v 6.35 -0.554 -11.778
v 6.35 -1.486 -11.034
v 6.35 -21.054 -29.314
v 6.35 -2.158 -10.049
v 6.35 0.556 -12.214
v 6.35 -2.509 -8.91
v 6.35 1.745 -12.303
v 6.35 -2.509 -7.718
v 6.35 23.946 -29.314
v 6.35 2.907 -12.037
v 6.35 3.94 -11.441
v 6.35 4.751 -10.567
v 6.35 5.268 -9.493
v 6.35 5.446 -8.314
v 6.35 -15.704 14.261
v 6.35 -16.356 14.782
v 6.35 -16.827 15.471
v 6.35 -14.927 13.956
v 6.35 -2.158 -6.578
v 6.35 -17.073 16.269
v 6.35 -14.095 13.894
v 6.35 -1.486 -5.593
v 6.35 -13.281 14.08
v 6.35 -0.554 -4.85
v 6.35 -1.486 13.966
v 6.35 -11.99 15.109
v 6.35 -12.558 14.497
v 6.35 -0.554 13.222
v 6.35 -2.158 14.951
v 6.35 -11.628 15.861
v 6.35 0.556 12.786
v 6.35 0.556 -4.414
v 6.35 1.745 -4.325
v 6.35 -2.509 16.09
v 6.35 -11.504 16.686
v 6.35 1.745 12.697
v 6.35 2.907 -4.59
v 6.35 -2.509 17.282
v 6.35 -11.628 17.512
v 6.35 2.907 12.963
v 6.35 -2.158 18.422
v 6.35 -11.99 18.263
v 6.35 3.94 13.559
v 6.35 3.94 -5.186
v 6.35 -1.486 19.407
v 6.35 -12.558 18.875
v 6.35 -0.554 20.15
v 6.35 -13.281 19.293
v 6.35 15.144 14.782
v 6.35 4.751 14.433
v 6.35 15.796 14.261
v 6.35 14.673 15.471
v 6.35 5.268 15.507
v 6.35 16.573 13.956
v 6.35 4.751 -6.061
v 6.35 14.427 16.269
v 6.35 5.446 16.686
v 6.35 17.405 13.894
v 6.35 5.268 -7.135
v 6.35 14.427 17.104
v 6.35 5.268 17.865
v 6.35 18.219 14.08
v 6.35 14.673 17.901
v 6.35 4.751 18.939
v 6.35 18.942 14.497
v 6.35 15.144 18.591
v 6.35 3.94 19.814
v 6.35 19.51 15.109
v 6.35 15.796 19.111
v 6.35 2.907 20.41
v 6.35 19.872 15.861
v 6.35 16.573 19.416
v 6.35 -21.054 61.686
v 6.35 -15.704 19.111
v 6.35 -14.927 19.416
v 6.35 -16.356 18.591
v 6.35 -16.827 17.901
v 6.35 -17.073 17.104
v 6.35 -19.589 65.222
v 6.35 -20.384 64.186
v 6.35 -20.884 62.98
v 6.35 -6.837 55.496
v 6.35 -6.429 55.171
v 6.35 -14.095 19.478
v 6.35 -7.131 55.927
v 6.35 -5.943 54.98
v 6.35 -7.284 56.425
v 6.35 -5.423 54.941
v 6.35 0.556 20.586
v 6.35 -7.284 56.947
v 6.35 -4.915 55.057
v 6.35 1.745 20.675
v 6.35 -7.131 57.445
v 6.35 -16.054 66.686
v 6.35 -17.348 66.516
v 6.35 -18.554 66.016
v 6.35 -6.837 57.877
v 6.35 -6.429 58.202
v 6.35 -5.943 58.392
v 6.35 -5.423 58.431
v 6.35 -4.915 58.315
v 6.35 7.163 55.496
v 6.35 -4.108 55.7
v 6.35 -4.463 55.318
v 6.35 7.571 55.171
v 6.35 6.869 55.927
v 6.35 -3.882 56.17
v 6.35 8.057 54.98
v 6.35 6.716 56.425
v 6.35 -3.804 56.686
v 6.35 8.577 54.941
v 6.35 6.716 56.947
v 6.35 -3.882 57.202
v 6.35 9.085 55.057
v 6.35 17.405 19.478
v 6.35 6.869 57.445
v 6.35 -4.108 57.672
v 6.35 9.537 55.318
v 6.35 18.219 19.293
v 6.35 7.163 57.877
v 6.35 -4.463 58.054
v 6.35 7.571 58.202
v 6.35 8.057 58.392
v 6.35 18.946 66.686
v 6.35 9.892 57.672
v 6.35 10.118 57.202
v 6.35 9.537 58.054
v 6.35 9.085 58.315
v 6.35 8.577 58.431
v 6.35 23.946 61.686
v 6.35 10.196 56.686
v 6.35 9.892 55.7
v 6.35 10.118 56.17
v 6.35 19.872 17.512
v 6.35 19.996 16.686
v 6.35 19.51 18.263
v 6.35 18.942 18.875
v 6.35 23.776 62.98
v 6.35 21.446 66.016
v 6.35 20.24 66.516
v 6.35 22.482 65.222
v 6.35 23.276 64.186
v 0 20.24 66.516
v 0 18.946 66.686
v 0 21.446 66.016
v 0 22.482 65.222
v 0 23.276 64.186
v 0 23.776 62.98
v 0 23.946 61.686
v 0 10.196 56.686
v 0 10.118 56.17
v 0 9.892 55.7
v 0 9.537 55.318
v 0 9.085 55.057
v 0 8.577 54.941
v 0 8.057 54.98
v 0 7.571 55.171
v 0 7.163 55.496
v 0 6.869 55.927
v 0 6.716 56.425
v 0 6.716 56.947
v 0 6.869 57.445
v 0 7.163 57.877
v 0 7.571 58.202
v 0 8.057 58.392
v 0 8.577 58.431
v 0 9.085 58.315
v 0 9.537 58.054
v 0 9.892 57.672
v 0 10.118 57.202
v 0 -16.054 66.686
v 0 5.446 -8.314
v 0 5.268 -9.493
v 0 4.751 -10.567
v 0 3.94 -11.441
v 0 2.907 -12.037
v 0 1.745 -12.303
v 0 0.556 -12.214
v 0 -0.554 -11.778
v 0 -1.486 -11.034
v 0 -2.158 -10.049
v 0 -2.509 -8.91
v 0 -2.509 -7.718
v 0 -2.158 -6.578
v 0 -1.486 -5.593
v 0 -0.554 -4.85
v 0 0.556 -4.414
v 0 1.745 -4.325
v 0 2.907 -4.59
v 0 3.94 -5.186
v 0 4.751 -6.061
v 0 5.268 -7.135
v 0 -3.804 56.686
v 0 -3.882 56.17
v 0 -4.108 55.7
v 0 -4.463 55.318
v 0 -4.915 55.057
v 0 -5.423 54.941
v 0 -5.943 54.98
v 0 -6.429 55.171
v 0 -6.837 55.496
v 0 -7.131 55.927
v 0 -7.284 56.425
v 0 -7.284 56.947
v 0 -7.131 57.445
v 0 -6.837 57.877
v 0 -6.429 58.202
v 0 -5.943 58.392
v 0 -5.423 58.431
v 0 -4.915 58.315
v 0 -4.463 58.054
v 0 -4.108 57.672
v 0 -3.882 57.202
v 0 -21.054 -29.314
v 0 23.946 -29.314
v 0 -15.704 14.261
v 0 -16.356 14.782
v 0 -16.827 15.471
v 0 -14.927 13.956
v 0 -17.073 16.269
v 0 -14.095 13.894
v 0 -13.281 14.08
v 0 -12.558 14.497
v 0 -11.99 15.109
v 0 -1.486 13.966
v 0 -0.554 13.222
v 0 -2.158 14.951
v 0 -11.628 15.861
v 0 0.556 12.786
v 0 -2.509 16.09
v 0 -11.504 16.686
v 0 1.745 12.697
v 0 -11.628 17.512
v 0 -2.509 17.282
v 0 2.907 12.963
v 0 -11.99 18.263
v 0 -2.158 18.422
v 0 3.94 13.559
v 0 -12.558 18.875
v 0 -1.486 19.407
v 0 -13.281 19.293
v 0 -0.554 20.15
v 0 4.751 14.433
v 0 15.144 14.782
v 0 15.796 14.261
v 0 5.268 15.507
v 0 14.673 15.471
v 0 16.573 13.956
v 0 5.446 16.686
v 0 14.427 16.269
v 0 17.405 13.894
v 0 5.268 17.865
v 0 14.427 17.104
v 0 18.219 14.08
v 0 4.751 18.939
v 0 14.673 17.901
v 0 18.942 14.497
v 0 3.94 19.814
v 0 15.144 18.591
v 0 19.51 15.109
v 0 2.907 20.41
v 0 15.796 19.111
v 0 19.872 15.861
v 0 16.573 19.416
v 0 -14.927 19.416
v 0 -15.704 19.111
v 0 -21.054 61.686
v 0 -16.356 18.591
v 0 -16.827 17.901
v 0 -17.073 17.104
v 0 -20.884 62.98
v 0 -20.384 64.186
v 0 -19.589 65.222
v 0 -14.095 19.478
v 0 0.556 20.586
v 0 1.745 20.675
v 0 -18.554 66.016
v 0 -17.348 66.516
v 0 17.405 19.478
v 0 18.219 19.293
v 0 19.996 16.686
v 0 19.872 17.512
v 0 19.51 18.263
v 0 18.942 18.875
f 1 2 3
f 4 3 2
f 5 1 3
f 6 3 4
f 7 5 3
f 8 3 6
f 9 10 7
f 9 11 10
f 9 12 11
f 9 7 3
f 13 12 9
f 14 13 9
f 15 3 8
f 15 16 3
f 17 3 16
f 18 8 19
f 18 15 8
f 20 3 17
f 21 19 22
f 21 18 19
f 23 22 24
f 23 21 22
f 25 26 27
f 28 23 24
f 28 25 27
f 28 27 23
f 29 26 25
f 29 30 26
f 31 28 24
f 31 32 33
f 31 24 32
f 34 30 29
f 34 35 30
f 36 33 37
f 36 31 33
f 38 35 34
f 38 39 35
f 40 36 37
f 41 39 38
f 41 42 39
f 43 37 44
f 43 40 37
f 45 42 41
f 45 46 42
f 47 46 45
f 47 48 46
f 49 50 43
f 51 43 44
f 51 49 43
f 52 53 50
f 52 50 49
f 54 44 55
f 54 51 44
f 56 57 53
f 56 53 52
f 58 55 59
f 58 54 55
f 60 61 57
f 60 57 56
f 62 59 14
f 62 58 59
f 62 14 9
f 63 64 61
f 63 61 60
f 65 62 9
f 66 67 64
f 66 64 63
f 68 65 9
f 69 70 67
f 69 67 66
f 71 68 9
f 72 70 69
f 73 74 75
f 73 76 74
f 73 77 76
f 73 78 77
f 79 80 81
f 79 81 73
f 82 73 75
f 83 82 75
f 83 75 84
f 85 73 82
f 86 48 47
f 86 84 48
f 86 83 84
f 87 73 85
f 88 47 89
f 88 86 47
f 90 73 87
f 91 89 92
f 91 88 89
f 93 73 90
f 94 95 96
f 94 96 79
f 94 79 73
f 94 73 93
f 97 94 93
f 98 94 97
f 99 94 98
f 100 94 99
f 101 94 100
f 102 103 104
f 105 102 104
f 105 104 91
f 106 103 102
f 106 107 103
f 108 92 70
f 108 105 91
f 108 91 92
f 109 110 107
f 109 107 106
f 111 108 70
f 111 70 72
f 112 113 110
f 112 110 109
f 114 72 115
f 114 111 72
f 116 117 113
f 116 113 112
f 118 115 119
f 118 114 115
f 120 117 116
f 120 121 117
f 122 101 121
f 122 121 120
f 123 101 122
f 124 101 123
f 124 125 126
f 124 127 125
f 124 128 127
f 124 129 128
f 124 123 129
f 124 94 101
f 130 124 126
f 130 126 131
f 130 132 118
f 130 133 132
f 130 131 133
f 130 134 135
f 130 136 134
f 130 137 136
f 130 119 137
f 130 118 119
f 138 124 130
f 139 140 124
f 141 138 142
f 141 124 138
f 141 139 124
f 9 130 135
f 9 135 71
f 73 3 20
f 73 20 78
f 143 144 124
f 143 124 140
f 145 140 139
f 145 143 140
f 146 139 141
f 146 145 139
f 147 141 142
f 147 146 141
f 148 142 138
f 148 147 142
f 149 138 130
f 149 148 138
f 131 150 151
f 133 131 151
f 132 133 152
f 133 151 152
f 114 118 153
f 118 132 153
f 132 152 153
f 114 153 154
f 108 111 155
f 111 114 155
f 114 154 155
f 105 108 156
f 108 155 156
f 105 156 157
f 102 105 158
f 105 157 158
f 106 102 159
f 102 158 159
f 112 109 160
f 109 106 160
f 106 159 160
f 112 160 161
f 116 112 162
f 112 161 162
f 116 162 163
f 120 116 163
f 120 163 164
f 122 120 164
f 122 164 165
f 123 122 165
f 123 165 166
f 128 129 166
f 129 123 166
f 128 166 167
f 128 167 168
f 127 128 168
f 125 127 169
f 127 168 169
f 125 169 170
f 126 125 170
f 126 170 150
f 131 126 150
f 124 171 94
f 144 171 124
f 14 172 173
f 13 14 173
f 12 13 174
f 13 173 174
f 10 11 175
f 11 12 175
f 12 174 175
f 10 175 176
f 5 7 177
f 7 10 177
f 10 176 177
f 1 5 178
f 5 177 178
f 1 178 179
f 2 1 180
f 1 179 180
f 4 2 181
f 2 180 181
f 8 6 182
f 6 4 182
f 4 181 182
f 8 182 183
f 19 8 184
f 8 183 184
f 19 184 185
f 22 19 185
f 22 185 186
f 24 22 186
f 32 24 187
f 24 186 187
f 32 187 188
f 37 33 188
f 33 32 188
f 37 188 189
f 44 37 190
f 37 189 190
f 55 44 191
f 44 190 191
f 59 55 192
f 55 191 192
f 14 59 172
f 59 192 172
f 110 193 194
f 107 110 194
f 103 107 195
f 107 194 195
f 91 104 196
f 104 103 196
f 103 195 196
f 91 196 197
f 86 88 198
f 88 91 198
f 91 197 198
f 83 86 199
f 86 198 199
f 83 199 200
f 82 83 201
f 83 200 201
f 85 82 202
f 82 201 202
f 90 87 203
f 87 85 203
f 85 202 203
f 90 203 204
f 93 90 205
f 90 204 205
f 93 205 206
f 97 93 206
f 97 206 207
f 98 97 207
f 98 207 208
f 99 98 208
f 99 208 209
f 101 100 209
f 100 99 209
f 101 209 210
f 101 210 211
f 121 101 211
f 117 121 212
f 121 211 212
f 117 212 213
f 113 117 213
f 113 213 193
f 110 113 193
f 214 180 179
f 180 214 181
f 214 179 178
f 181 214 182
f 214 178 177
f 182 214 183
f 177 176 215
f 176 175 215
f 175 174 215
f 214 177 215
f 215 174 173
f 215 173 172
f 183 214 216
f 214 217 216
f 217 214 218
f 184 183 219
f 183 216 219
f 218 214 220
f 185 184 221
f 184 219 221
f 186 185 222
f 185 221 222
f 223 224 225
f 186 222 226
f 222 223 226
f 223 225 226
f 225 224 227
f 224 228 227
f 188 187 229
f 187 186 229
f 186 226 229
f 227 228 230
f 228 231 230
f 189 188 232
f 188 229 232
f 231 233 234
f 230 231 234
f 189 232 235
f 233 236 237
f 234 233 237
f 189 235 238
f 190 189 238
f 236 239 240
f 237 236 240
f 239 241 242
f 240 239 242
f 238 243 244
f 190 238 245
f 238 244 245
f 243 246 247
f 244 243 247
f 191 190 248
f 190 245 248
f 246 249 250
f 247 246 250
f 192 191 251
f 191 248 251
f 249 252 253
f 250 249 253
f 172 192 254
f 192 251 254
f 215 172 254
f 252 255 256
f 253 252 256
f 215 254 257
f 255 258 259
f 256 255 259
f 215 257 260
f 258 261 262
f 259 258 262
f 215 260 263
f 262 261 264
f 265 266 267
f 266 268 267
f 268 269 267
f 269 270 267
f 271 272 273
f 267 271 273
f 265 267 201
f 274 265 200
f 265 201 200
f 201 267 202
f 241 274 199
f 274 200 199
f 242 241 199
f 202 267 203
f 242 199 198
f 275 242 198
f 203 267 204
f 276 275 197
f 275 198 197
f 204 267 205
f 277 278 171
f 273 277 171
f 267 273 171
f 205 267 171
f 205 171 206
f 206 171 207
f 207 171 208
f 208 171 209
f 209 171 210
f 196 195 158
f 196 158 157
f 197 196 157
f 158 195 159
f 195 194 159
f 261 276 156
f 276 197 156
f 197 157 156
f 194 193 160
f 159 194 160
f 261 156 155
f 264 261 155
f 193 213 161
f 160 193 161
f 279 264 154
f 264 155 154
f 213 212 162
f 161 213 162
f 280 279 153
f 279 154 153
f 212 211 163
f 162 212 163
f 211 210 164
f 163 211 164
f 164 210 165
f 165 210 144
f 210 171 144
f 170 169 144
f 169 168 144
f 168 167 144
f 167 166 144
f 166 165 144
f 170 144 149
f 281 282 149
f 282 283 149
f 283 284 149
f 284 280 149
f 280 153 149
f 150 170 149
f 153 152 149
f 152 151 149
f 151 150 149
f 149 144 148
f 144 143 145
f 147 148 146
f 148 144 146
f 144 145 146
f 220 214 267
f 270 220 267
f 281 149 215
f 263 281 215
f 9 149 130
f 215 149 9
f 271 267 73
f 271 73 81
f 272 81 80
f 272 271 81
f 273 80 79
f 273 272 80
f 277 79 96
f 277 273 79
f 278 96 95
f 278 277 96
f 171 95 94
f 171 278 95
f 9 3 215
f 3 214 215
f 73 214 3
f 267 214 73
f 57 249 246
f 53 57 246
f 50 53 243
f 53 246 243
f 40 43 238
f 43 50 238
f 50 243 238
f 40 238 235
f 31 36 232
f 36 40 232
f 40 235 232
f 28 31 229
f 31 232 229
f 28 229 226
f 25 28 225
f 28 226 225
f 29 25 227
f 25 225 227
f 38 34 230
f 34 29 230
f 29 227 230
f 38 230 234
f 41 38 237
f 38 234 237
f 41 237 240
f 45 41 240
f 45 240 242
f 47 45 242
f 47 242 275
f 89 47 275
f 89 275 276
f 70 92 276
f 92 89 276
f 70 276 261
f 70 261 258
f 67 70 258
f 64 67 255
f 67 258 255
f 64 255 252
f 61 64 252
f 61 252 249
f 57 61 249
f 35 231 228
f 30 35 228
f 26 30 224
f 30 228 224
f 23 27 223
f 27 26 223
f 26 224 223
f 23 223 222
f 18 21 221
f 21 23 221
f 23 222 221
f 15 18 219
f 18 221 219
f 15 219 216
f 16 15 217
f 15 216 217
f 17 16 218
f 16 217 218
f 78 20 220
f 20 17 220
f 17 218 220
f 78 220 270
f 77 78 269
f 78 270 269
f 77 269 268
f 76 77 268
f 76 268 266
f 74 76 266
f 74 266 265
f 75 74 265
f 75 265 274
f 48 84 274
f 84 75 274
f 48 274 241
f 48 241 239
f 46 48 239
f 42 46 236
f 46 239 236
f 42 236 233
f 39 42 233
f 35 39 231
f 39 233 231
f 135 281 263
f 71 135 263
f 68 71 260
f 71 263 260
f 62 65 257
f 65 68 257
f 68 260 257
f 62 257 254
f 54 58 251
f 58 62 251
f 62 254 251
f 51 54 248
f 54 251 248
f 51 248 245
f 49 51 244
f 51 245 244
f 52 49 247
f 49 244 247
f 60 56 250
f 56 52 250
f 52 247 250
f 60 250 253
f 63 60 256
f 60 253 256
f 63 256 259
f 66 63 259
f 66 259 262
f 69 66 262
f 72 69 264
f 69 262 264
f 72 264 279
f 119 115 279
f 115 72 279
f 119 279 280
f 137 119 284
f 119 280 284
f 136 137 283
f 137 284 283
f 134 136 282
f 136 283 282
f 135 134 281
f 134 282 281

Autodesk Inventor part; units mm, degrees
ref_plane "YZ Plane" through (0, 0, 0) normal (1, 0, 0) x (0, 1, 0)
ref_plane "XZ Plane" through (0, 0, 0) normal (0, 1, 0) x (-1, 0, 0)
ref_plane "XY Plane" through (0, 0, 0) normal (0, 0, 1) x (1, 0, 0)
sketch "Sketch1" plane through (0, 0, 0) normal (1, 0, 0) x (0, 1, 0)
  line L0 (-16.0539, 66.6862) -> (18.9461, 66.6862)
  line L1 (23.9461, 61.6862) -> (23.9461, -29.3138)
  line L2 (-21.0539, -29.3138) -> (-21.0539, 61.6862)
  circle A0 centre (-6.3039, -8.3138) radius 1.75
  circle A1 centre (1.4461, -16.0638) radius 1.75
  circle A2 centre (9.1961, -8.3138) radius 1.75
  circle A3 centre (1.4461, -0.5638) radius 1.75
  circle A4 centre (1.4461, 16.6862) radius 4
  line L3 (-21.0539, -29.3138) -> (23.9461, -29.3138)
  circle A5 centre (17.1961, 16.6862) radius 2.8
  circle A6 centre (1.4461, -8.3138) radius 4
  circle A7 centre (-14.3039, 16.6862) radius 2.8
  arc A8 (-16.0539, 66.6862) -> (-21.0539, 61.6862) centre (-16.0539, 61.6862) ccw
  arc A9 (23.9461, 61.6862) -> (18.9461, 66.6862) centre (18.9461, 61.6862) ccw
  circle A10 centre (-5.5539, 56.6862) radius 1.75
  circle A11 centre (8.4461, 56.6862) radius 1.75
  point P0 (0, 0)
  point P1 (-21.0539, 66.6862)
  point P2 (23.9461, 66.6862)
  dimension "d4" = 360
  dimension "d7" = 8
  dimension "d15" = 8
  dimension "d16" = 5.6
  dimension "d20" = 5.6
  dimension "d21" = 31.5
  dimension "d22" = 15.75
  dimension "d23" = 25
  dimension "d25" = 5
  dimension "d26" = 45
  dimension "d28" = 22.5
  dimension "d29" = 14
  dimension "d30" = 15.5
  dimension "d31" = 3.5
  dimension "d32" = 3.5
  dimension "d33" = 91
  dimension "d34" = 10
extrude "Extrusion1" add sketch "Sketch1" along normal blind 6.35 contours L0 A9 L1 L3 L2 A8 | A0 | A1 | A2 | A3
equation "\"d28\" = 0.5 * d26"
properties part number "carriage"
